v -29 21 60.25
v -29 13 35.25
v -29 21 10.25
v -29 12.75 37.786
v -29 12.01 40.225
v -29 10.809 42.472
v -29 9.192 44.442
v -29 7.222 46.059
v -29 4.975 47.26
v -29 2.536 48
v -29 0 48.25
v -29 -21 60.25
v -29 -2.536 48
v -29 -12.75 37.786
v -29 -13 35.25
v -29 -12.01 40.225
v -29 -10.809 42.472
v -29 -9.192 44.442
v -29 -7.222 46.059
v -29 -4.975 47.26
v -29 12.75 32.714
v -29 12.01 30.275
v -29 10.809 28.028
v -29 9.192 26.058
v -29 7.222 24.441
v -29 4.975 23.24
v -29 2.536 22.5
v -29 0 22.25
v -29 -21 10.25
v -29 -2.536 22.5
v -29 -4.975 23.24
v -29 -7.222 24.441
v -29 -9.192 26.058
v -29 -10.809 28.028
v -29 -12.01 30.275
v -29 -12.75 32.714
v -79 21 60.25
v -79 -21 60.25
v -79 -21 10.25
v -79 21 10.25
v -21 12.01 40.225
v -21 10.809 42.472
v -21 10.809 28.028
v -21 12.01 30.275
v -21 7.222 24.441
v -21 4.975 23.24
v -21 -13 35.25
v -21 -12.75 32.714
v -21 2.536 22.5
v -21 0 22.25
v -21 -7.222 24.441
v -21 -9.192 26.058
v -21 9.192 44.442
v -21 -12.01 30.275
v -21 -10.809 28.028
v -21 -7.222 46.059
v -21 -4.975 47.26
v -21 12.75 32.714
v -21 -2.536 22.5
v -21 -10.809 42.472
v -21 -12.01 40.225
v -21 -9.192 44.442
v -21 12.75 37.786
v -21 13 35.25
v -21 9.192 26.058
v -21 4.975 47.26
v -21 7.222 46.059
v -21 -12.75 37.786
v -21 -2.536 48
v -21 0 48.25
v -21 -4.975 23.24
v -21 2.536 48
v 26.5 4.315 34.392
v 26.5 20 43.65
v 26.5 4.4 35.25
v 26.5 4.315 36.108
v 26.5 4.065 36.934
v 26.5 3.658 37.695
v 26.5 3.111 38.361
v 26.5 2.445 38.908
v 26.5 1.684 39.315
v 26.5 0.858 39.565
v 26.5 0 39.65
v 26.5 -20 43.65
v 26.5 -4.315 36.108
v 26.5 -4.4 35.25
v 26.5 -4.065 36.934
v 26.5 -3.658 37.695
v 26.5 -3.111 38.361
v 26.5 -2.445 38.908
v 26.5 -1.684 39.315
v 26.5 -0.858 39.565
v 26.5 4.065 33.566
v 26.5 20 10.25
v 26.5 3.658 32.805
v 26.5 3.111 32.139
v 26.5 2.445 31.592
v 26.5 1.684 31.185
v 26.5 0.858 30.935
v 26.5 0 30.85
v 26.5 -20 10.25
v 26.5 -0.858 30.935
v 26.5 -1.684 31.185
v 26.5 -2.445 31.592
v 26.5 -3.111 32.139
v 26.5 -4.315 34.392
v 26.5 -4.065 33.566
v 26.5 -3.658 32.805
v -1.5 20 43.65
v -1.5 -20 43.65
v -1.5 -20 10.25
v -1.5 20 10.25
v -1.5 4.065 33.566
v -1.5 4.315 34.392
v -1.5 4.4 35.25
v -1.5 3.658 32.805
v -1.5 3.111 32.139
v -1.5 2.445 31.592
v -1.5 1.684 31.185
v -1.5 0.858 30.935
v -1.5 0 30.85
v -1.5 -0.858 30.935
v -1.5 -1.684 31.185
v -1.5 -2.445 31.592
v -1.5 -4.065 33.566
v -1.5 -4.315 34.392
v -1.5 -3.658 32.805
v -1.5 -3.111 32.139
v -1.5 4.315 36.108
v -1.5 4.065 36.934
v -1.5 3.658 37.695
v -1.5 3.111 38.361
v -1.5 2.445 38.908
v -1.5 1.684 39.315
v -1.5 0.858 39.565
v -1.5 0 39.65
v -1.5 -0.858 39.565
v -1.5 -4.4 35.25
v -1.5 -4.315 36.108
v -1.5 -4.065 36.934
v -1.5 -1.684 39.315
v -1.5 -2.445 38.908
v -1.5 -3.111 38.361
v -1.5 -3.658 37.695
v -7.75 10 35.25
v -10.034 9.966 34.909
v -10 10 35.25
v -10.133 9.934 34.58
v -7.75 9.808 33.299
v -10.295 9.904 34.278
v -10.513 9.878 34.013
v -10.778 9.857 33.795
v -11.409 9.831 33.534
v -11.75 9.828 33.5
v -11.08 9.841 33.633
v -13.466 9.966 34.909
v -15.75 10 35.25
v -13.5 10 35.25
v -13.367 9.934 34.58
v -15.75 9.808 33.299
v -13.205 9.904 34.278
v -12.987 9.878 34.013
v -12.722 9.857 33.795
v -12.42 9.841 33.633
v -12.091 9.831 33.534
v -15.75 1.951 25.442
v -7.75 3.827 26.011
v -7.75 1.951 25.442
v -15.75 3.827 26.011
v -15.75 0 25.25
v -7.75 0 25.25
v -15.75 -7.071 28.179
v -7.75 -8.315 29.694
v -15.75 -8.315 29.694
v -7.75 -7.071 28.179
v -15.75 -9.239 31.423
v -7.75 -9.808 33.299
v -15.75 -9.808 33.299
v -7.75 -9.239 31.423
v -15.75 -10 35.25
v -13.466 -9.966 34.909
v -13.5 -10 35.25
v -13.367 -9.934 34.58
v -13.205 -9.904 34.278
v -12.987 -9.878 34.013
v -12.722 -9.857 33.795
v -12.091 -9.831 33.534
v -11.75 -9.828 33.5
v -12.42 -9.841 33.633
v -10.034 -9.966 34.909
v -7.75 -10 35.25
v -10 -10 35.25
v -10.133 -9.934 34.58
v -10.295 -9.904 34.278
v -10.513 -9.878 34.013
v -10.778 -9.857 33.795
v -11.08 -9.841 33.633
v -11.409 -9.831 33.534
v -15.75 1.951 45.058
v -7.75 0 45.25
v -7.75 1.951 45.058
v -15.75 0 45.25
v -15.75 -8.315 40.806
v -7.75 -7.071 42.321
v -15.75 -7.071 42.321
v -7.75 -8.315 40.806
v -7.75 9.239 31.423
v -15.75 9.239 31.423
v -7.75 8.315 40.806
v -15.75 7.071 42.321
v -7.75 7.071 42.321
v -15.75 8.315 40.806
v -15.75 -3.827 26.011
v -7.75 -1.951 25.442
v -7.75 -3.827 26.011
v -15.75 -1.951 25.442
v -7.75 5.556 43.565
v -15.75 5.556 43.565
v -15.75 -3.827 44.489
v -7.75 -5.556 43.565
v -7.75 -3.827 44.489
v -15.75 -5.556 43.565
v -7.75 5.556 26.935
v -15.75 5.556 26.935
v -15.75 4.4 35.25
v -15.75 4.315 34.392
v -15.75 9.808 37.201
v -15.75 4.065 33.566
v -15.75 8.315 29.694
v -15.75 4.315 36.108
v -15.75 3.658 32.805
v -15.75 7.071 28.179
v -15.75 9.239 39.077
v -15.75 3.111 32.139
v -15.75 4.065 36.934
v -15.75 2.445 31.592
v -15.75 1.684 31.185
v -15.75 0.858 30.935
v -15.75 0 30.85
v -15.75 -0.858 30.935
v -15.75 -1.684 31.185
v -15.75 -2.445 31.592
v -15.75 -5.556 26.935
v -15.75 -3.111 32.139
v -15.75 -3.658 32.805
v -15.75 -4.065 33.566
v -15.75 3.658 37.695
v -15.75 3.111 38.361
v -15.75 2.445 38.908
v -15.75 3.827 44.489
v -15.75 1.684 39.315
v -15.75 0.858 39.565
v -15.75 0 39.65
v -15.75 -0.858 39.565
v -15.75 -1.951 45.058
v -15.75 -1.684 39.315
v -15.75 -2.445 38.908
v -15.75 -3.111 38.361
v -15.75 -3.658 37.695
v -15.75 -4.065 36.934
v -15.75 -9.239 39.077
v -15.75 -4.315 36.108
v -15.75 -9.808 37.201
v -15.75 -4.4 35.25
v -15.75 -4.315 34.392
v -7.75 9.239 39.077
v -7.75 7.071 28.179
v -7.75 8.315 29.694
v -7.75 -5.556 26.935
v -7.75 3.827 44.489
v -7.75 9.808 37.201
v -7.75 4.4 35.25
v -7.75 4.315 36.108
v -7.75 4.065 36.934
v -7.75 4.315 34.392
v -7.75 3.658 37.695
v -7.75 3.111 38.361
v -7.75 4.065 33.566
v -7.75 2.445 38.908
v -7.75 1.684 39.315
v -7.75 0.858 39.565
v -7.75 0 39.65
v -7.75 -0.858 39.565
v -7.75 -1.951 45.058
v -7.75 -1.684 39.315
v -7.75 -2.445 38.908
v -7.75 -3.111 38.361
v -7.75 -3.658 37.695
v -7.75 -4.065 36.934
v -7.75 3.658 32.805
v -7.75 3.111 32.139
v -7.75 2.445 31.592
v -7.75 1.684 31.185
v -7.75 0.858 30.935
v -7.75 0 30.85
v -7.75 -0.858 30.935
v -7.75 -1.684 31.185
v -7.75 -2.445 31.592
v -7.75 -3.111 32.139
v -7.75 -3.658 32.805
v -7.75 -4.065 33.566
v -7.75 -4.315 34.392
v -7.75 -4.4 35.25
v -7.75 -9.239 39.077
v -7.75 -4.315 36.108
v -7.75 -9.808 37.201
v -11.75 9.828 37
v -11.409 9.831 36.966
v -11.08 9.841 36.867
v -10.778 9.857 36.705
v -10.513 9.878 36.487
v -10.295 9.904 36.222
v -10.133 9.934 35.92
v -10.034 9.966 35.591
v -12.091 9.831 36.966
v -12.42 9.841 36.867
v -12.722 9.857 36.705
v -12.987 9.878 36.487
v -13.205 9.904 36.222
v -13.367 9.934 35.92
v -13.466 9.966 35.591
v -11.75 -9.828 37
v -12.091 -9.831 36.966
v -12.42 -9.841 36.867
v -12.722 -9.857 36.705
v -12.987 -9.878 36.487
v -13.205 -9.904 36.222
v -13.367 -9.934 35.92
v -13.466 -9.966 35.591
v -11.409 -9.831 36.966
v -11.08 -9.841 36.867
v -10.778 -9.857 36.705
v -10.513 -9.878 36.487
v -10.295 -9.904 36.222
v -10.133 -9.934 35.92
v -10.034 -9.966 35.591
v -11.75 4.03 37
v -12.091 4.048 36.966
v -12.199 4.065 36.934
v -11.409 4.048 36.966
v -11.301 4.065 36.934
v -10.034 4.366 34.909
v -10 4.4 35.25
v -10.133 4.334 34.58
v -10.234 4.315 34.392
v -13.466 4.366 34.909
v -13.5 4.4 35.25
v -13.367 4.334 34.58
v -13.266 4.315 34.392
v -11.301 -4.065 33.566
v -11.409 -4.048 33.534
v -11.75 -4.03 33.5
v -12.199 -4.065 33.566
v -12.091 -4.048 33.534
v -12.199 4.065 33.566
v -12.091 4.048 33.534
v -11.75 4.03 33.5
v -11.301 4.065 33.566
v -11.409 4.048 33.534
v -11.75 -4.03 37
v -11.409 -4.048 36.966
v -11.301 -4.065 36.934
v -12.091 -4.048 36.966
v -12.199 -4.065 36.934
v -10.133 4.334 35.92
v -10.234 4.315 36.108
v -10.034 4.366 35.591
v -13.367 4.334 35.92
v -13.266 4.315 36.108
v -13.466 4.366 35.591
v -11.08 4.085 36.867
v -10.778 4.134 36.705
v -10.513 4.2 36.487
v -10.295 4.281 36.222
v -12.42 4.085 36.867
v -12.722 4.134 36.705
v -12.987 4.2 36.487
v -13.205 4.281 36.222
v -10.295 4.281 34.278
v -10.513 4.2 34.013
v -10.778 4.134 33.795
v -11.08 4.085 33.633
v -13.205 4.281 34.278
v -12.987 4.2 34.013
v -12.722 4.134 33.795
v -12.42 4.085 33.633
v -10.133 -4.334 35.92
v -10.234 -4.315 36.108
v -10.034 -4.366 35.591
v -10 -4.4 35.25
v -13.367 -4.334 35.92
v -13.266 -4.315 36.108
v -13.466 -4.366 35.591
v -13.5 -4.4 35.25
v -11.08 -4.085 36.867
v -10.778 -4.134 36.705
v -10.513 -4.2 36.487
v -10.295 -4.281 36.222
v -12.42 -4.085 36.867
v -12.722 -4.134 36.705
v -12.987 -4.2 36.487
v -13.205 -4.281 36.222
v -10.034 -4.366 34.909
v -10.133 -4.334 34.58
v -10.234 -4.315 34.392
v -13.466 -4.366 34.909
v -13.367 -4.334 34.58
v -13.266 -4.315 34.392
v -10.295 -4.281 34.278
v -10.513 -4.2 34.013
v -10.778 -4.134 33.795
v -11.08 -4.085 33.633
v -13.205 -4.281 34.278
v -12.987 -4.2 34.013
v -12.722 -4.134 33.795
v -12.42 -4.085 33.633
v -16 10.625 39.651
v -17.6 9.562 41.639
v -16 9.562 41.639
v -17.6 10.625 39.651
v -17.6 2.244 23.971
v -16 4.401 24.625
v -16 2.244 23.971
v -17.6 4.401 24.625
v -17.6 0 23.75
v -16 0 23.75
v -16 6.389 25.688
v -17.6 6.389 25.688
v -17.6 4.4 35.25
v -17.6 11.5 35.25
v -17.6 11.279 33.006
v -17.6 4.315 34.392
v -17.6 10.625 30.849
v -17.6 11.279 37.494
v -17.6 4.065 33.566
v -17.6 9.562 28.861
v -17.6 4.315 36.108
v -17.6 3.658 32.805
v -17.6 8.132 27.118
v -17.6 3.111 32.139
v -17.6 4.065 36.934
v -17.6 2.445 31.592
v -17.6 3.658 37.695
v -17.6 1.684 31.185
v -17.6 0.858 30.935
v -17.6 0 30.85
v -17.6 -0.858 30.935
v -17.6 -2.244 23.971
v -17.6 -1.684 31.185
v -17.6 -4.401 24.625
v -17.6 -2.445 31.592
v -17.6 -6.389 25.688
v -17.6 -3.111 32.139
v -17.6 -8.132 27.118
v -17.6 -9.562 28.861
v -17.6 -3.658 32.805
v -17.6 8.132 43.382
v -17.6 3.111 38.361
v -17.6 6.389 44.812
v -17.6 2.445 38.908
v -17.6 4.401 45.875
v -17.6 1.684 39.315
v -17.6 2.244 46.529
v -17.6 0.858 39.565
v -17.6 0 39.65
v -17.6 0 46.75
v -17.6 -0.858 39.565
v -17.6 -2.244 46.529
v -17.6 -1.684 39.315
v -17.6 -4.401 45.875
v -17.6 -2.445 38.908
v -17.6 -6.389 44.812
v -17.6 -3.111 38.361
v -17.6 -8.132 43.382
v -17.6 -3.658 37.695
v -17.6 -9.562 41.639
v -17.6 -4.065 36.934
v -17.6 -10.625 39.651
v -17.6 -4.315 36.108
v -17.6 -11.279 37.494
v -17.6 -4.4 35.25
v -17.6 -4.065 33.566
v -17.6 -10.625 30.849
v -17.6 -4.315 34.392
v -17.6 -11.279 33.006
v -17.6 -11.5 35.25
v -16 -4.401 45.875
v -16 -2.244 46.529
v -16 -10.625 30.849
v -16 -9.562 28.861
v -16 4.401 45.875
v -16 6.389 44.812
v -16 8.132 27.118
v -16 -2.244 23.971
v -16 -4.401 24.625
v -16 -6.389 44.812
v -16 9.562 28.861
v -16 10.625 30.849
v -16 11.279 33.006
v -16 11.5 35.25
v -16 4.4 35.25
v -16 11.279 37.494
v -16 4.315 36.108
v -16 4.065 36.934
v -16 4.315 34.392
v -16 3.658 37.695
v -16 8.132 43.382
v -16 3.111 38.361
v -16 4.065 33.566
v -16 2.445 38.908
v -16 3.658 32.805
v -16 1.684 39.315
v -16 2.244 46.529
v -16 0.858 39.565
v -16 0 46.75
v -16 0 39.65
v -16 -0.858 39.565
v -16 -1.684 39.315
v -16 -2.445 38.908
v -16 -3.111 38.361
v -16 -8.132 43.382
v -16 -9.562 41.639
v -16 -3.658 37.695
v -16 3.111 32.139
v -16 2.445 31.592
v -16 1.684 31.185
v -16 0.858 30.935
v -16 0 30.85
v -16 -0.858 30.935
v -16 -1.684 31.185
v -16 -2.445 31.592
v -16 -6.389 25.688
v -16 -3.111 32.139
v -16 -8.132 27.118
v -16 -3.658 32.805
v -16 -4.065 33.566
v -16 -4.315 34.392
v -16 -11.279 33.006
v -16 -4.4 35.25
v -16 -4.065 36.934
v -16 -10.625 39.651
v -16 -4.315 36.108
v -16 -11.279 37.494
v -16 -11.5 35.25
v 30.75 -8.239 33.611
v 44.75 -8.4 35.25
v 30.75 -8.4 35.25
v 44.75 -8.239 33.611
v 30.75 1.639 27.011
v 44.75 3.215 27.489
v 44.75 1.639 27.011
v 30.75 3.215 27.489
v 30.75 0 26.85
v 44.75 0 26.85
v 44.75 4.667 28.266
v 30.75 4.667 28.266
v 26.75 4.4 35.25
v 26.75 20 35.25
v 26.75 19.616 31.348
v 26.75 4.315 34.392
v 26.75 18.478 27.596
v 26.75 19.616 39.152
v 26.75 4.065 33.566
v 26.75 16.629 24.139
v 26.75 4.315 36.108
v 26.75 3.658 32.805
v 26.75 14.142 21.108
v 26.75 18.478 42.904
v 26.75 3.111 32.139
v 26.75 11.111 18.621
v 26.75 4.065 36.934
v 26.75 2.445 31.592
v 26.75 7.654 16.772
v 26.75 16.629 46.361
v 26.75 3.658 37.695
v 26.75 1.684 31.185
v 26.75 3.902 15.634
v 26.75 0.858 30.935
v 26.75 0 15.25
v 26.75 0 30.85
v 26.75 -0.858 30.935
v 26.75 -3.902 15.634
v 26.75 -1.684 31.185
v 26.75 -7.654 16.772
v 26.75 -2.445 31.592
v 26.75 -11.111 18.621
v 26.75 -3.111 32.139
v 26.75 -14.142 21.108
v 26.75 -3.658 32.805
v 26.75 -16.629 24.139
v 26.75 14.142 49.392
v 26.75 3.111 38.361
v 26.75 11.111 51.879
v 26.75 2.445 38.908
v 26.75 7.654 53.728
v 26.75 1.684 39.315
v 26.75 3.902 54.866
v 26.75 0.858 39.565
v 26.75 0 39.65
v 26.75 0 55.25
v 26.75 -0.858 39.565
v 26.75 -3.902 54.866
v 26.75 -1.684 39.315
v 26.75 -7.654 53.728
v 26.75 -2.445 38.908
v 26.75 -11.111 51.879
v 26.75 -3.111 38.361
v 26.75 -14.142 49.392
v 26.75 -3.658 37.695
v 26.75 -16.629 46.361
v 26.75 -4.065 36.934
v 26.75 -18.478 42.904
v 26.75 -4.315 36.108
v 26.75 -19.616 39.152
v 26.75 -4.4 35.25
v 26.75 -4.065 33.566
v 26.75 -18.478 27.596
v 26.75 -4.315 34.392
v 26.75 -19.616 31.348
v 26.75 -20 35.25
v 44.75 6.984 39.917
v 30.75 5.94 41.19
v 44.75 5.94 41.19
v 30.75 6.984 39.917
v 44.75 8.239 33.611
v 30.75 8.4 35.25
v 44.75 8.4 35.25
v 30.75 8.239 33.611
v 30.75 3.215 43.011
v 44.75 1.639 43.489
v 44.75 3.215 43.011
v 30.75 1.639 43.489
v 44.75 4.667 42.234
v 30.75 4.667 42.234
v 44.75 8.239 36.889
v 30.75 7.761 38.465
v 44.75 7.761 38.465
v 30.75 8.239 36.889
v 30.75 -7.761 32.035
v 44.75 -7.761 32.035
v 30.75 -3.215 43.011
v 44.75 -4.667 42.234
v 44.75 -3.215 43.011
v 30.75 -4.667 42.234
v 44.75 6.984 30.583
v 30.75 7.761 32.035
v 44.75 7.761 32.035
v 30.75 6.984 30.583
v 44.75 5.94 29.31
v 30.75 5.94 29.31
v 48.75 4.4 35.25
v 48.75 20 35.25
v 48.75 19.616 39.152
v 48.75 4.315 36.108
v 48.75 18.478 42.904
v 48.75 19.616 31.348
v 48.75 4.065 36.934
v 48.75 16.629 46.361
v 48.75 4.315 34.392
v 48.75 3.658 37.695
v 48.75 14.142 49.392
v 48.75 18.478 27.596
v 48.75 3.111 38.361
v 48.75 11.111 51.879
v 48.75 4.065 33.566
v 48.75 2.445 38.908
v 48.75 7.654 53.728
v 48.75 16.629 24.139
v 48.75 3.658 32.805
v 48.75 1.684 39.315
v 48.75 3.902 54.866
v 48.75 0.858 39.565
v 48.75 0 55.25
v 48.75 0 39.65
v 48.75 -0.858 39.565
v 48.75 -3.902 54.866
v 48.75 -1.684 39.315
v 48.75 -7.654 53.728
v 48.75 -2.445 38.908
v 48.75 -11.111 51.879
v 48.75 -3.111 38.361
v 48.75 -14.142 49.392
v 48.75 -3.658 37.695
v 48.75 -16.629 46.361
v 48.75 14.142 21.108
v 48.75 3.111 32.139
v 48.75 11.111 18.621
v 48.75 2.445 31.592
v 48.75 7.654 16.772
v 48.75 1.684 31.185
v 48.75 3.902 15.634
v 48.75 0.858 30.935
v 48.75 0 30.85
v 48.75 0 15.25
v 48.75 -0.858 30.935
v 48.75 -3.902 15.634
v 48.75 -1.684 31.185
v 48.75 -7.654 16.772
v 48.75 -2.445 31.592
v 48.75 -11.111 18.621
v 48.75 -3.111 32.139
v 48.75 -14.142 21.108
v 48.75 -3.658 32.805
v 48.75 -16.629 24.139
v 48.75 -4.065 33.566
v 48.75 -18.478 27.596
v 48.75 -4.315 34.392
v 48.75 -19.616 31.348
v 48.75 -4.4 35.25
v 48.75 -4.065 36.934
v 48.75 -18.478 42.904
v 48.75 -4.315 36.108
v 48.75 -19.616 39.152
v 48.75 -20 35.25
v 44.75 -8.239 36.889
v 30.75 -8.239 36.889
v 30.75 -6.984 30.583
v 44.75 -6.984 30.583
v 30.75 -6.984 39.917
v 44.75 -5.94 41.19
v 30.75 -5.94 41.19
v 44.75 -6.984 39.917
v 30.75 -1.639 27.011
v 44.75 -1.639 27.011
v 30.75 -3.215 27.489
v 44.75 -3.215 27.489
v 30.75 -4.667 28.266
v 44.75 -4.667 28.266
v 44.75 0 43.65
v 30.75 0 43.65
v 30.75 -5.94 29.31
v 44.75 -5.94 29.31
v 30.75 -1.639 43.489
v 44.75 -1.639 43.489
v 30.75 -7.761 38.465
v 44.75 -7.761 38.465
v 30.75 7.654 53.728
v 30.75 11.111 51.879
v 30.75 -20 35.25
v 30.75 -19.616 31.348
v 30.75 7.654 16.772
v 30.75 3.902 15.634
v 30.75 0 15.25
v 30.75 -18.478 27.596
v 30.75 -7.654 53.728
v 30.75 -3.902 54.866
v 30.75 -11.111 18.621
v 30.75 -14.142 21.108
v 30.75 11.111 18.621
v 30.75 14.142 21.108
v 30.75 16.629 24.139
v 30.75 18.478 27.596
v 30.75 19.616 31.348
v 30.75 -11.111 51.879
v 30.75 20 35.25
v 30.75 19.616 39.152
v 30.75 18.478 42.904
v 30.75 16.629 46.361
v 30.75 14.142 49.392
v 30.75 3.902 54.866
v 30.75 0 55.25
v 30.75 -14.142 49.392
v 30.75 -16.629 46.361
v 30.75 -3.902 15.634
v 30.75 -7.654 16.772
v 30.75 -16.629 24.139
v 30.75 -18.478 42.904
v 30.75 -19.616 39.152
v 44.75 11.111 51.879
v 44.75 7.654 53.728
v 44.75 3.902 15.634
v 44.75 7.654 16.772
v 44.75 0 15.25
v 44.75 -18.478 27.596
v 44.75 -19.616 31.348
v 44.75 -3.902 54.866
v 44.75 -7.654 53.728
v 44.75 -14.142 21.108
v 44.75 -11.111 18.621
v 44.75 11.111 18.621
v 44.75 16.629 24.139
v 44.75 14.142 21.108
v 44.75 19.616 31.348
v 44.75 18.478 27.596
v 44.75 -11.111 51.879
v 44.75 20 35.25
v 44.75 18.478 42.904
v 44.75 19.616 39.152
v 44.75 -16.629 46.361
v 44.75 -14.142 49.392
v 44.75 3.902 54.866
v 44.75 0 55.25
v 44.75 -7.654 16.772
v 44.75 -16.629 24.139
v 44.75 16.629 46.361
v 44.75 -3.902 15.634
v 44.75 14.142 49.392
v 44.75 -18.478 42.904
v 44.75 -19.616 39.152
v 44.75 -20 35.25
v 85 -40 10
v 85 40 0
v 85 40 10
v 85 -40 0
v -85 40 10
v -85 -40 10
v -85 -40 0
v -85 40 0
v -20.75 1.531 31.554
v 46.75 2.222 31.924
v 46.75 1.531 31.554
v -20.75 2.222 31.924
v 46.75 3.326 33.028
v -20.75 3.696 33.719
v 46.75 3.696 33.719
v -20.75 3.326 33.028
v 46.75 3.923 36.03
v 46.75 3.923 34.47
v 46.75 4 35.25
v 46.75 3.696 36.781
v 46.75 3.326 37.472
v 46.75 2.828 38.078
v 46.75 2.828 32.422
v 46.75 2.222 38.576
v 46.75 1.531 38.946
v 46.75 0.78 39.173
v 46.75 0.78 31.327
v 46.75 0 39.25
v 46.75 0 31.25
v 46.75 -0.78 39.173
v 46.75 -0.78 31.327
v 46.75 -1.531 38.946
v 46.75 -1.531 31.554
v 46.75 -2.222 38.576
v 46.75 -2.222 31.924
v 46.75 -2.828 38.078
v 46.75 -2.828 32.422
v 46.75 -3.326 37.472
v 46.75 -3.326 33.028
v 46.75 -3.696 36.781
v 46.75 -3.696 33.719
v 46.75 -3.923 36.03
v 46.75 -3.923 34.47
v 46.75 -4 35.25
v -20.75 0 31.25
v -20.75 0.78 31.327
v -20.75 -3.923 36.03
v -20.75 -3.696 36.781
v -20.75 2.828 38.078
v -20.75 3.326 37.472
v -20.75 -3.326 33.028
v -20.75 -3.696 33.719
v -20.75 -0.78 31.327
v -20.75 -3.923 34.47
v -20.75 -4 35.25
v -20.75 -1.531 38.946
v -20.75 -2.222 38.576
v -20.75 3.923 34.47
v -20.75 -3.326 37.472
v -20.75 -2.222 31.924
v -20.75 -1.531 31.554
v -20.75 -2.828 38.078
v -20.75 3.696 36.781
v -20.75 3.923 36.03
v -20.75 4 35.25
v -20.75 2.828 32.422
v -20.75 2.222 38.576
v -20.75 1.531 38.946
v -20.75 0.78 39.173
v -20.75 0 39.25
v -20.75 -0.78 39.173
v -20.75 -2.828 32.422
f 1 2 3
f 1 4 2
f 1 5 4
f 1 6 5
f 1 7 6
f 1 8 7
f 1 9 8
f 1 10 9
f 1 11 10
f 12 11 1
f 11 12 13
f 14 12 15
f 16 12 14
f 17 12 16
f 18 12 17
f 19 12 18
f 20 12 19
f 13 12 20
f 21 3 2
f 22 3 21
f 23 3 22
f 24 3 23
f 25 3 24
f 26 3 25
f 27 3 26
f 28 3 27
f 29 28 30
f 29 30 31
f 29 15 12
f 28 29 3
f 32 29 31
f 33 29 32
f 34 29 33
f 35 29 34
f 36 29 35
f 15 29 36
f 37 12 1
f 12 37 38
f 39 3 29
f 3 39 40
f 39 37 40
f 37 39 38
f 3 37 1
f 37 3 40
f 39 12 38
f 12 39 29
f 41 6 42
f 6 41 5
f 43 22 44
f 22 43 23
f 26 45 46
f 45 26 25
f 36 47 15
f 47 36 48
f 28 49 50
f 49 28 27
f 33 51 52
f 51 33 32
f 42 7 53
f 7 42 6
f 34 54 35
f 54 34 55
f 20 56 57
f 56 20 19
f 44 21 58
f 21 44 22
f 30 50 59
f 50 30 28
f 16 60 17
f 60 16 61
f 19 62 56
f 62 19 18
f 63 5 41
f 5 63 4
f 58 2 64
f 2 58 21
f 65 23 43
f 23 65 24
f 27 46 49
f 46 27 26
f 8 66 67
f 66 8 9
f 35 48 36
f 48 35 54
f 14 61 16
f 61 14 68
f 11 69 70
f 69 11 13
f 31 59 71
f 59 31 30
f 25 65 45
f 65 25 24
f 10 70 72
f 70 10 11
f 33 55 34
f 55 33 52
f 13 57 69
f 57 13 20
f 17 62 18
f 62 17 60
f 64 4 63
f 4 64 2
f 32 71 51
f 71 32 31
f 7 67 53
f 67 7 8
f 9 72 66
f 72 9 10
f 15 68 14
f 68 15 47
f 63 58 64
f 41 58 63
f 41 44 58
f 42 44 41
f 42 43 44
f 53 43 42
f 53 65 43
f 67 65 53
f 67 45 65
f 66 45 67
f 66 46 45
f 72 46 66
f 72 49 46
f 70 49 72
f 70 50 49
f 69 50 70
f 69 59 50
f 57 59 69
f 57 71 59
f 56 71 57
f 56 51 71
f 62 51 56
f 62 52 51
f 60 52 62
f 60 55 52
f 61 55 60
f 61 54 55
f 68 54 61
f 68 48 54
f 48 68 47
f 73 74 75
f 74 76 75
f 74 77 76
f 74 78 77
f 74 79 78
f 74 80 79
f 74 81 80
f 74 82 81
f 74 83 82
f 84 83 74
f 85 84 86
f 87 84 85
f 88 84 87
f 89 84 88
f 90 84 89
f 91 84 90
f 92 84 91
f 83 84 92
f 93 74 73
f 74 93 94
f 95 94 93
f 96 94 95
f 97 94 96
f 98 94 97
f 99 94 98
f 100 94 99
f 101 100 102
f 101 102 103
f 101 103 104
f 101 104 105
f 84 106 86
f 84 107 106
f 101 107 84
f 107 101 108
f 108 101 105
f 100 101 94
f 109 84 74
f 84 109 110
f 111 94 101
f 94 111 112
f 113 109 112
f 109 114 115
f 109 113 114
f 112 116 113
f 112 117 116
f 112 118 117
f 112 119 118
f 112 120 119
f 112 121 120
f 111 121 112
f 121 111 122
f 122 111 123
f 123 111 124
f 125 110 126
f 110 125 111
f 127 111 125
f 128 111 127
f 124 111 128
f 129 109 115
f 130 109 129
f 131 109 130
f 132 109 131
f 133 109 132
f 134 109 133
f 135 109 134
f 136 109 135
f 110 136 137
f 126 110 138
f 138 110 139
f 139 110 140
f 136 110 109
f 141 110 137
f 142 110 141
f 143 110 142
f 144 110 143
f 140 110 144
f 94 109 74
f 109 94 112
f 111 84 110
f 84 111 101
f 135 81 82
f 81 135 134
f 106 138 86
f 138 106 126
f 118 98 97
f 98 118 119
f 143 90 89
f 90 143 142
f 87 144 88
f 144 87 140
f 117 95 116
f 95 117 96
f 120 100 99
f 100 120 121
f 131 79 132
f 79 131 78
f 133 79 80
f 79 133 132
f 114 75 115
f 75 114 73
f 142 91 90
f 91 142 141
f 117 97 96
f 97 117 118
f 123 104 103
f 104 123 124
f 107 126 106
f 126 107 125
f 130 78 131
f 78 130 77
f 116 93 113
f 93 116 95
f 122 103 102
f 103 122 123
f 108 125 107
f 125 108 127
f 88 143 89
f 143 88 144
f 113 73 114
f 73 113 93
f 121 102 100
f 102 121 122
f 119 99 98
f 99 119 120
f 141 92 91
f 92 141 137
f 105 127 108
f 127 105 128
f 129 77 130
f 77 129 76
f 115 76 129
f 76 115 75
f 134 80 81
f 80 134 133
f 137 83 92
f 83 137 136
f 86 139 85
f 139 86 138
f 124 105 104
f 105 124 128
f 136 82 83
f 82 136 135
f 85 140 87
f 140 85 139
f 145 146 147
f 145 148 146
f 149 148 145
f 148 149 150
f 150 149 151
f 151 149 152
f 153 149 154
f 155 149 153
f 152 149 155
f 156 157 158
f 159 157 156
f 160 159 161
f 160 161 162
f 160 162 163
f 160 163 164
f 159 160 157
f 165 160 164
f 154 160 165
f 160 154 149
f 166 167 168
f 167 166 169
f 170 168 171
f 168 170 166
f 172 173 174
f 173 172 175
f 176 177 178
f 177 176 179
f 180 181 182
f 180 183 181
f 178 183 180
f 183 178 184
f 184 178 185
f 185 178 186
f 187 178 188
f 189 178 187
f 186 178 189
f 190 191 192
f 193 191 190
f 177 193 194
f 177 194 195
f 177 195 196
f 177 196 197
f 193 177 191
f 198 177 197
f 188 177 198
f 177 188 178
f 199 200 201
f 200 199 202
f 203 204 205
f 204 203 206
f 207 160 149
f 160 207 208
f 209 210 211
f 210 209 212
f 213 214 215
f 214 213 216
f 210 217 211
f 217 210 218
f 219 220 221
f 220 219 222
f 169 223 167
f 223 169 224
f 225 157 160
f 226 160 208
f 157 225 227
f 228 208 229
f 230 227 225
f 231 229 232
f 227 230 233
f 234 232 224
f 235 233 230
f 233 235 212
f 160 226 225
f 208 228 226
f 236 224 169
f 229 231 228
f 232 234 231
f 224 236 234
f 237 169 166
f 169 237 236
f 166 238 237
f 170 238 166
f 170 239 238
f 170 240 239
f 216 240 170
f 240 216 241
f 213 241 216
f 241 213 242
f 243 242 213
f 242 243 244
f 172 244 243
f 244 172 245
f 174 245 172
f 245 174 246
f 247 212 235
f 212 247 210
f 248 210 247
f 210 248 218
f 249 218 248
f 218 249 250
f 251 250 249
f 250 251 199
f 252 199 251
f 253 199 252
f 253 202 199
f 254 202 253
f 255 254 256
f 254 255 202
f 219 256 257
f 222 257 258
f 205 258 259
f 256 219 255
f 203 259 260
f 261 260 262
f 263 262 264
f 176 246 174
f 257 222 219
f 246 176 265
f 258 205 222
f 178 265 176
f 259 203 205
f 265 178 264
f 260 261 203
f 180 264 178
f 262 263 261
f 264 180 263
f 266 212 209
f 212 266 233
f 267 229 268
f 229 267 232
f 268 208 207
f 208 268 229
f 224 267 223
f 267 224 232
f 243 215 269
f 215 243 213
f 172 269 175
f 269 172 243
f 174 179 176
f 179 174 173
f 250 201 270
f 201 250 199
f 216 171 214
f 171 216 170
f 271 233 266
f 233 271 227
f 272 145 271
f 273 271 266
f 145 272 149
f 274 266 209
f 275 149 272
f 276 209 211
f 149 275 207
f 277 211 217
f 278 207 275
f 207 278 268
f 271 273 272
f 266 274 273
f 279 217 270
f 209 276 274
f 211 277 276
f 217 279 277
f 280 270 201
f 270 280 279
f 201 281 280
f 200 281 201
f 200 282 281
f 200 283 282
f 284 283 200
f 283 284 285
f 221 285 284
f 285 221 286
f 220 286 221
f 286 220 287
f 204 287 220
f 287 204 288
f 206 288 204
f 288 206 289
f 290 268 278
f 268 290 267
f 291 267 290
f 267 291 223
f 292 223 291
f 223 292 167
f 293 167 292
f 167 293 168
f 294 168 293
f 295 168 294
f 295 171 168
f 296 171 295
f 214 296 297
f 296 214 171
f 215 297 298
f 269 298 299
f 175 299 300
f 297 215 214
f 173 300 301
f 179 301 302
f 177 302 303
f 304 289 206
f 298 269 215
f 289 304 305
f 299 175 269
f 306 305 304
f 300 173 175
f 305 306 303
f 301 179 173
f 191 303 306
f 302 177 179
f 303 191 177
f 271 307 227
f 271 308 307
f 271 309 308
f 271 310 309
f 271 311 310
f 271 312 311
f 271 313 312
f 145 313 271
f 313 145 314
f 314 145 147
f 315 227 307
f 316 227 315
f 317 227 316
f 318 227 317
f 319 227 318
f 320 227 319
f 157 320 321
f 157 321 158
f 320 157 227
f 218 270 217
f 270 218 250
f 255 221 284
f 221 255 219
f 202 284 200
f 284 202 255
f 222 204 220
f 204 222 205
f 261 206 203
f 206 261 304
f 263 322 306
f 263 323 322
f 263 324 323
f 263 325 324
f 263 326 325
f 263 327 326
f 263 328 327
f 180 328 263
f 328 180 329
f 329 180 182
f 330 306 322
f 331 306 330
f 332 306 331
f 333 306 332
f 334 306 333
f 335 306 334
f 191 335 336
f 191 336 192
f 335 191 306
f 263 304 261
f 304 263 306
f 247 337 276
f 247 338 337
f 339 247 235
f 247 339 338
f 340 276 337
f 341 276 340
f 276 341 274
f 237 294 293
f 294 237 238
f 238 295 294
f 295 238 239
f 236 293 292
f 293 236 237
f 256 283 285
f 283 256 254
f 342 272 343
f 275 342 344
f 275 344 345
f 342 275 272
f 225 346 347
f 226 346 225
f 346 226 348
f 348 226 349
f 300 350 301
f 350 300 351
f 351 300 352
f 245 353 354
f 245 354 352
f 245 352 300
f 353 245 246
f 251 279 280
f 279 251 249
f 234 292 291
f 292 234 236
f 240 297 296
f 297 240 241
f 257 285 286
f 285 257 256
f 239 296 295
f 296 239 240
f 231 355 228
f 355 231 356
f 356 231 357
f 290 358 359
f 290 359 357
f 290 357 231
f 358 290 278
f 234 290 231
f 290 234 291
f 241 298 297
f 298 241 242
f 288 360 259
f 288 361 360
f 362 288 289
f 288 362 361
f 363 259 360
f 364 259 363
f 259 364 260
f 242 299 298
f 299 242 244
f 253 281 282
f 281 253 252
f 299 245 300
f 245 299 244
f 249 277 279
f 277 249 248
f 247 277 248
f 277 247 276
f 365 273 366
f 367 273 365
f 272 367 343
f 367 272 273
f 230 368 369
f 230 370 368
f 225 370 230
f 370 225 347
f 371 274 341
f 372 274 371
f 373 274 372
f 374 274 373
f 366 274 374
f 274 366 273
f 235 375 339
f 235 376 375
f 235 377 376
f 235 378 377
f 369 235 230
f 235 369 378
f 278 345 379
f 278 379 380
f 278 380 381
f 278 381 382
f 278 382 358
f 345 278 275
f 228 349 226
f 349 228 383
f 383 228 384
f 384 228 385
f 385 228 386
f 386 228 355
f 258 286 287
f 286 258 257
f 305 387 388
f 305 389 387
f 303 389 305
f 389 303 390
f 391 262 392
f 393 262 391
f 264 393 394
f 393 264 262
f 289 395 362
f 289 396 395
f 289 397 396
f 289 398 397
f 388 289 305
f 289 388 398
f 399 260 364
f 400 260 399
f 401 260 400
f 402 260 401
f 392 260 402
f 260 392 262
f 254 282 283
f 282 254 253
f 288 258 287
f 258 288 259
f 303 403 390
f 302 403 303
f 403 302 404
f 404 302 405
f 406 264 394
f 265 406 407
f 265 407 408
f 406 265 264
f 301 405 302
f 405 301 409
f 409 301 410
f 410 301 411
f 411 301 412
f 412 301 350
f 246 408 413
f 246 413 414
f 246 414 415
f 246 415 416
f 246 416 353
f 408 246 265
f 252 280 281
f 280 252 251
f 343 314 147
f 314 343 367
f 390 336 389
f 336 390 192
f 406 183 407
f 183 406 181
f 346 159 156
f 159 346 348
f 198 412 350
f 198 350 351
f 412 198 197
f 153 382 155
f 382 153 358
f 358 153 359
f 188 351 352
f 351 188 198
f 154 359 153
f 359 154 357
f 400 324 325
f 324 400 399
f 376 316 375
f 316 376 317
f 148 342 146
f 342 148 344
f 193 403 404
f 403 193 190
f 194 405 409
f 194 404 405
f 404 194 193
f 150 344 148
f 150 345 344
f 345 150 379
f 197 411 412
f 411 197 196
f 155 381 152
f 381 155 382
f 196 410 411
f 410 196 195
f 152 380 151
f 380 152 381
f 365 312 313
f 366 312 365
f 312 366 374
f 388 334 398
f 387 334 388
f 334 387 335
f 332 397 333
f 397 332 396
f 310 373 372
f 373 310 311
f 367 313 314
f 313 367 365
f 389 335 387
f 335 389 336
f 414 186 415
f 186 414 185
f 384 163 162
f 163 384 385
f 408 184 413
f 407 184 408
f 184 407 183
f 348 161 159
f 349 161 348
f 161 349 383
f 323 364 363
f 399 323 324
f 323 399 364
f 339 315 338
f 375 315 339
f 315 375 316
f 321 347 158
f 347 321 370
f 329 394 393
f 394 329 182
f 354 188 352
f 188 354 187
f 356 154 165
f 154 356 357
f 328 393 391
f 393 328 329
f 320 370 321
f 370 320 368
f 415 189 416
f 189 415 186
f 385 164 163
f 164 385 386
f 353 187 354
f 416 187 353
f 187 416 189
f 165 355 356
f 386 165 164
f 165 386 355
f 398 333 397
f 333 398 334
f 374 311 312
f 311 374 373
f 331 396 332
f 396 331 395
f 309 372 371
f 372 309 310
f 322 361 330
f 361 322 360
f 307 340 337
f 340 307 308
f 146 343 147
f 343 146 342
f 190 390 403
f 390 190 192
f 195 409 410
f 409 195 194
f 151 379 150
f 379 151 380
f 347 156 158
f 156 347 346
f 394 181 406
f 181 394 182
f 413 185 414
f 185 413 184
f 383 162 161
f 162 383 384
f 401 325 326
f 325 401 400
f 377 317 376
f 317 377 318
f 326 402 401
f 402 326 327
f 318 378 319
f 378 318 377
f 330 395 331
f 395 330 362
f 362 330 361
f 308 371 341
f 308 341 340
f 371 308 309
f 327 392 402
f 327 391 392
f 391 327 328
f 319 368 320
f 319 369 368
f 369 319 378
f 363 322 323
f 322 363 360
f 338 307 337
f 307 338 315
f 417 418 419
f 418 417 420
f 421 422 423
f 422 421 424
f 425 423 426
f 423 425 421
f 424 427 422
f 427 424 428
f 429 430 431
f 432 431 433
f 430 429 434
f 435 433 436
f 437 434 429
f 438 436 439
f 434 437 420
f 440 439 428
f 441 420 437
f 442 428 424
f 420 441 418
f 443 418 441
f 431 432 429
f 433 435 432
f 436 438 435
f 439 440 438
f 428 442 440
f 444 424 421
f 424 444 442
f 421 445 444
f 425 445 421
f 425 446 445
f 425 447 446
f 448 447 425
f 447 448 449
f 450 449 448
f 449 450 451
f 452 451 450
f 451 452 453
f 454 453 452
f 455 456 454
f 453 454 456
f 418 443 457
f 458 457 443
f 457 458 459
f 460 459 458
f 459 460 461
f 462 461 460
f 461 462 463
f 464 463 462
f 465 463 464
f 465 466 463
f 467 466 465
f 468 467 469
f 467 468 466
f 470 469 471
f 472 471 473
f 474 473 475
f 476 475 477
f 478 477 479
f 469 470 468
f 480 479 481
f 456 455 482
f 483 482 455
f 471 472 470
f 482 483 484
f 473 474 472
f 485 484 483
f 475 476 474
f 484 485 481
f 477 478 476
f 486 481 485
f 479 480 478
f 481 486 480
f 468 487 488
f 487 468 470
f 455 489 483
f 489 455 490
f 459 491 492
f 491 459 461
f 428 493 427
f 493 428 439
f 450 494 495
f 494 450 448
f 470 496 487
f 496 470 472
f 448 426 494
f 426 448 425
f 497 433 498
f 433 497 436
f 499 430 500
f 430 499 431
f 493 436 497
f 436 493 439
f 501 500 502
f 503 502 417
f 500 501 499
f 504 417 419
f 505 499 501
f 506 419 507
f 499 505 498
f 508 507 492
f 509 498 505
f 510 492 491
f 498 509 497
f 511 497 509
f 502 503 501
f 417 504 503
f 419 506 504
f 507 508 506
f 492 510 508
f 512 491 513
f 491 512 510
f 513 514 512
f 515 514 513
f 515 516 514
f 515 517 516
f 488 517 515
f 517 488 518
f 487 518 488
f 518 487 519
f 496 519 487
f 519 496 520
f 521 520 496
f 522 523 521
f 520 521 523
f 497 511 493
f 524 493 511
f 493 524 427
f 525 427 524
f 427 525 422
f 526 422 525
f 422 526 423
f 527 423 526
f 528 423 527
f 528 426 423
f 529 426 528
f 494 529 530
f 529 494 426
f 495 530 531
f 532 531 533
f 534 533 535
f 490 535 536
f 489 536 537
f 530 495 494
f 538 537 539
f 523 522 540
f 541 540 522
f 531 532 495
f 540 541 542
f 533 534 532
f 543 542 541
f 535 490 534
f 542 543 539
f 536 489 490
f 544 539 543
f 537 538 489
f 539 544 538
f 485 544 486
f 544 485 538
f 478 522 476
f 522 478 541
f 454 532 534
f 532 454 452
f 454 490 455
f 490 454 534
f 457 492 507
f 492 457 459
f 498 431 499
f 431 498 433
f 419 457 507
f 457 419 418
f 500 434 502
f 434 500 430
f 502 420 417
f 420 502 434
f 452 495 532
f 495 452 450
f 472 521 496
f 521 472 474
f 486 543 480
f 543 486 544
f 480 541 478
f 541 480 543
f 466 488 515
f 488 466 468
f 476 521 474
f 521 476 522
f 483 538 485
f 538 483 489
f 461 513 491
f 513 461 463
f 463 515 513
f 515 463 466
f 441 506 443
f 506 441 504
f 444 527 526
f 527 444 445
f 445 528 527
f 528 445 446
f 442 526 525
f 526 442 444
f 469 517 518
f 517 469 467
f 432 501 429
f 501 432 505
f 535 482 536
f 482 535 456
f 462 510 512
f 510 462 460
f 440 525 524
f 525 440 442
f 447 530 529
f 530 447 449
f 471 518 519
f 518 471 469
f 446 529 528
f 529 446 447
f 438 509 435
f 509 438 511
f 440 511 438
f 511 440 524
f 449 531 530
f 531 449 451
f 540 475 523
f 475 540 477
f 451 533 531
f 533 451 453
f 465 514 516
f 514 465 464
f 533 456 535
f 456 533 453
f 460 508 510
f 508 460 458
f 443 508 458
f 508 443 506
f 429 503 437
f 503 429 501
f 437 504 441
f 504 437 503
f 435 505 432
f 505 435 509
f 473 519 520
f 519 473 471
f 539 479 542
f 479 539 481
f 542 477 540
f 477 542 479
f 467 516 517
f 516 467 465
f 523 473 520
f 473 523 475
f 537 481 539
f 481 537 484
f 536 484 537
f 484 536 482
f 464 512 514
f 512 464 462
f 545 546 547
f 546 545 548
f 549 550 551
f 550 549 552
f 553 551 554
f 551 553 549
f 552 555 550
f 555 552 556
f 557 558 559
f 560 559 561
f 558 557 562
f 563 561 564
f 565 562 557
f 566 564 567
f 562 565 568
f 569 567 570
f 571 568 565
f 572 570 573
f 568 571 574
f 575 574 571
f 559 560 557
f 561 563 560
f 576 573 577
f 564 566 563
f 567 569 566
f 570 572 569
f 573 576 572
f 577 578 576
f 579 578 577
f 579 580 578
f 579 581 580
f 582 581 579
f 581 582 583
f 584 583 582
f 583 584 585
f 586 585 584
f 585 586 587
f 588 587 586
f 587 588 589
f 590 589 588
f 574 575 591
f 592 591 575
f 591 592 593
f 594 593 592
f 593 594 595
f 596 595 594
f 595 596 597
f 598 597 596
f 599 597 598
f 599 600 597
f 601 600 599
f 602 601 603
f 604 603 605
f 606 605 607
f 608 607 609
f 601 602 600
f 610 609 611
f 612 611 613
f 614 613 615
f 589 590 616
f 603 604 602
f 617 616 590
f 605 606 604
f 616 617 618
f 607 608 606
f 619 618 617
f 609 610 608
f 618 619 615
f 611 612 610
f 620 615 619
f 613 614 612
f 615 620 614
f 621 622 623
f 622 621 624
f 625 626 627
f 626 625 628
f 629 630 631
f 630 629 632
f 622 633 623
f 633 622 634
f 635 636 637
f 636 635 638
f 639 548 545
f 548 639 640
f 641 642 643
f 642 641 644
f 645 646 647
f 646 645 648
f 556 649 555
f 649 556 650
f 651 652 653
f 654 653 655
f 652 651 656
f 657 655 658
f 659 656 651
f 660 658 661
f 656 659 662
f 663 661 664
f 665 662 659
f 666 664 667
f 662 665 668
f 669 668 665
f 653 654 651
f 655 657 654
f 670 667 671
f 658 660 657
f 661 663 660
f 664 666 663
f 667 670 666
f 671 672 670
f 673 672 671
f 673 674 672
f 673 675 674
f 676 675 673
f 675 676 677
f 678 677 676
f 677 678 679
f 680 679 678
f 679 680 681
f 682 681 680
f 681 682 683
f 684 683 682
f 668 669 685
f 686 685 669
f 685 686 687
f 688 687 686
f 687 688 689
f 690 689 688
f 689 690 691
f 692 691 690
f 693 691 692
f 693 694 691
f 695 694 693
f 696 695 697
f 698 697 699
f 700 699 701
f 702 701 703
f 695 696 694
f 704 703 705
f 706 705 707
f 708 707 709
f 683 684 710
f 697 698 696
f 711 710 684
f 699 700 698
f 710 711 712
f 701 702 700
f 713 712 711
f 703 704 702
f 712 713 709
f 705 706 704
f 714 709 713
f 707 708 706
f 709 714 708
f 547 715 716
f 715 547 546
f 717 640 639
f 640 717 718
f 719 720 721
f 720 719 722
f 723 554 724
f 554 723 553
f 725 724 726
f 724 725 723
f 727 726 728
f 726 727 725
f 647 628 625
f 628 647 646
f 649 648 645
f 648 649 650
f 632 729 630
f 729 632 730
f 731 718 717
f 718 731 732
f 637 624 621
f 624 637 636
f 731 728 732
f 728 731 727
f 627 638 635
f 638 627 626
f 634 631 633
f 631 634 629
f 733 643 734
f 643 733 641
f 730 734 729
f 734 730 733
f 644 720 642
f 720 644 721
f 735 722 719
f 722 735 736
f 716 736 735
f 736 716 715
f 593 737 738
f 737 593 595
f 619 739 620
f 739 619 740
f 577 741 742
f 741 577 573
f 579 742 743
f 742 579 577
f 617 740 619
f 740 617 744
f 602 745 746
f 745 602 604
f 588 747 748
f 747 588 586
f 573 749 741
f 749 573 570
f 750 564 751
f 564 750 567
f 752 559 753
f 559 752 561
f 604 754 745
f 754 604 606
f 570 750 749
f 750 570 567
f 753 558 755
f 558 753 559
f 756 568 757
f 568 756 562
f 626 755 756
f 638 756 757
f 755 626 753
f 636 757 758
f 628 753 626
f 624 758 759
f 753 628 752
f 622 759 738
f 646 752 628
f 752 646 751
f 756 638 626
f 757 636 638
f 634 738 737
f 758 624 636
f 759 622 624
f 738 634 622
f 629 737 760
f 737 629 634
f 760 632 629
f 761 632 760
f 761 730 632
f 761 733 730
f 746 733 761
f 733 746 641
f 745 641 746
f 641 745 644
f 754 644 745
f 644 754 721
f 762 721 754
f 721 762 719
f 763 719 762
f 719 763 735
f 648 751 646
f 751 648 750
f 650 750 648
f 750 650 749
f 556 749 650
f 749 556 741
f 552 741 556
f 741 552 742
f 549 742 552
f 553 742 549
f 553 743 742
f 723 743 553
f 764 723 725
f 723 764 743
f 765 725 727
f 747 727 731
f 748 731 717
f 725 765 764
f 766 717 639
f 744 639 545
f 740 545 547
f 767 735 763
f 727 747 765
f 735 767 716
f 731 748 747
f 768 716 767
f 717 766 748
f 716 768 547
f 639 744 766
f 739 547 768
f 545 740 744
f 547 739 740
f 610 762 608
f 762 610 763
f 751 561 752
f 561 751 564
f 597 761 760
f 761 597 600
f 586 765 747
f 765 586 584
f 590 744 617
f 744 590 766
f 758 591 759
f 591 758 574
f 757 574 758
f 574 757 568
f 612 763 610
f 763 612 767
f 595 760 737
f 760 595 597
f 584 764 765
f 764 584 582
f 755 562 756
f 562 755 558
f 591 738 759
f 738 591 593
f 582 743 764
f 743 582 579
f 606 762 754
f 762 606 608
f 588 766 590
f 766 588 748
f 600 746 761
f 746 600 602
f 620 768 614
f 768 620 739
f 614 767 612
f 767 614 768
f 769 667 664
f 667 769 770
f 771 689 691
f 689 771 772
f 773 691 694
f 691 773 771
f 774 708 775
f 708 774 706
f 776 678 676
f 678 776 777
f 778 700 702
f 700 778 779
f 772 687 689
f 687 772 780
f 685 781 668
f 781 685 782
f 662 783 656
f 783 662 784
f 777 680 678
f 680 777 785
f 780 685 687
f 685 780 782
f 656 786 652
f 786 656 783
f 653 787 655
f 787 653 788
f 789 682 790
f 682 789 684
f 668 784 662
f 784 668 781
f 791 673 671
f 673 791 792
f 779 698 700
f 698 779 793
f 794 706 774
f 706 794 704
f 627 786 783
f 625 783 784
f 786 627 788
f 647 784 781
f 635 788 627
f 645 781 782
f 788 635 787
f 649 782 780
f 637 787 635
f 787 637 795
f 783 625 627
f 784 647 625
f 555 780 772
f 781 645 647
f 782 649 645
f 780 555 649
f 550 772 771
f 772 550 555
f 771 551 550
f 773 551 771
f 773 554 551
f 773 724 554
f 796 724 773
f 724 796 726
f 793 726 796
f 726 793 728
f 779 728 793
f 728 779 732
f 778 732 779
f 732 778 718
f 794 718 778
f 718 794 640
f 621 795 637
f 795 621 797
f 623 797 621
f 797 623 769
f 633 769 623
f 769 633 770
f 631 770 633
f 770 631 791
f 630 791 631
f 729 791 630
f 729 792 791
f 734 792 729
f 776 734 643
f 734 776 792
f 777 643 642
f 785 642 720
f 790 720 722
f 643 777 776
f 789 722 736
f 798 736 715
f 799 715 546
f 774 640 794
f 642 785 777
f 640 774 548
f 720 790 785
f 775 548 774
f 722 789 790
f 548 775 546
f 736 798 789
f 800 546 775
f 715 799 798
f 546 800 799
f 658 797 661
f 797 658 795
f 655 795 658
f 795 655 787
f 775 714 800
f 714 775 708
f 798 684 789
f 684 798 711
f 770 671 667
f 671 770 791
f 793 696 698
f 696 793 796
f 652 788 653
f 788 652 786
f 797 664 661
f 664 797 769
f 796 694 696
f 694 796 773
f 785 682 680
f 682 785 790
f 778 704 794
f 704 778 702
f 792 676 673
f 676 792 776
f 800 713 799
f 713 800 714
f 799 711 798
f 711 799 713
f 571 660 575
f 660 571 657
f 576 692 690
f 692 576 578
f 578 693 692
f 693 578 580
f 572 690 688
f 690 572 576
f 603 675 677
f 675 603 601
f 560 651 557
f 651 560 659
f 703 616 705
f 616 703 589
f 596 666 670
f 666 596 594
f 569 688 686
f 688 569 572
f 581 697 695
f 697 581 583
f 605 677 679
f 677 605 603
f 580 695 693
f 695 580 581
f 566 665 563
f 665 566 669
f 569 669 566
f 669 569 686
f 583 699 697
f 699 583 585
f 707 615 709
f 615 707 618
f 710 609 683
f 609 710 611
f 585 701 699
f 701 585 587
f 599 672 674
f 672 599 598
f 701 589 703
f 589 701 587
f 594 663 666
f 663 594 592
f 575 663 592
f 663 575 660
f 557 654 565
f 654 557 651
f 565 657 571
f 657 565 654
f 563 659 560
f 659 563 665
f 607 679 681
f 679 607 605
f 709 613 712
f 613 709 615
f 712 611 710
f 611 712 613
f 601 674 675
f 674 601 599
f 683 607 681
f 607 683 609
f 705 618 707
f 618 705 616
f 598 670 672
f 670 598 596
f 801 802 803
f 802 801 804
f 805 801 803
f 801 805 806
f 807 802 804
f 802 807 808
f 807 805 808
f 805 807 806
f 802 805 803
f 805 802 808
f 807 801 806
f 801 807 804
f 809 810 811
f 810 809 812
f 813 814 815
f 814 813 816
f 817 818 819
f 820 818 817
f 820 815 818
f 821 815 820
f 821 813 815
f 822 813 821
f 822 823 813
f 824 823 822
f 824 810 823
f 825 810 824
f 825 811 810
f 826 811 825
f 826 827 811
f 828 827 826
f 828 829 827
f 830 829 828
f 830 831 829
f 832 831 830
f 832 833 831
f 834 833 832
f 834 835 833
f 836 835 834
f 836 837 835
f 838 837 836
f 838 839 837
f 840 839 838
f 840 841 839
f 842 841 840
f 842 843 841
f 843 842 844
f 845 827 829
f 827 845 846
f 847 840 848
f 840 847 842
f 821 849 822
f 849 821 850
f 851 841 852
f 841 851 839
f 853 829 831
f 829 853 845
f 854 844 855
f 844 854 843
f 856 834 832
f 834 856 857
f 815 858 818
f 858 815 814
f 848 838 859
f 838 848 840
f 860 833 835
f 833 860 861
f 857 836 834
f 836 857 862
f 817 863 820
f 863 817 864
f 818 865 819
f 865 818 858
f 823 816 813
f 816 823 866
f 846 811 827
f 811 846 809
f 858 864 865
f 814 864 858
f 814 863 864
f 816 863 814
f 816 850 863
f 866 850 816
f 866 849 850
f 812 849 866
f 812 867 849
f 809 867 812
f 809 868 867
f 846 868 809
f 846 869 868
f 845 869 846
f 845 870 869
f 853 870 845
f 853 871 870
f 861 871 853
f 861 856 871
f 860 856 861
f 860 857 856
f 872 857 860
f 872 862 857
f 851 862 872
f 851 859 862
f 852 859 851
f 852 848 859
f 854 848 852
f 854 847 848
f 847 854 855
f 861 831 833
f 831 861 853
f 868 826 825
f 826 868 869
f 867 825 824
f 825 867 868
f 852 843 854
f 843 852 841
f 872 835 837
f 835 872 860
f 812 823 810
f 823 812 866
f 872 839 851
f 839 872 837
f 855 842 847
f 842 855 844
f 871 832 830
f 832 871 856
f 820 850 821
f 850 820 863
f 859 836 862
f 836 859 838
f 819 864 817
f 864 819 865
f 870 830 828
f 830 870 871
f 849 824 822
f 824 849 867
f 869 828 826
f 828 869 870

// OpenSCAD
$fn = 32;

// ------------------------------------------------------------------------
// Motor drive station: motor 50 x 50 mm, shaft d8, pulley d40
// Every part is its own module, assembly() places every instance.
// ------------------------------------------------------------------------

// --- part 1 ---
module station_bed() {
  difference() {
    translate([-85, -40, 0]) cube([170, 80, 10]);
  }
}

// --- part 2 ---
module drive_motor() {
  union() {
    translate([-25, -21, 0]) cube([50, 42, 50]);
    translate([29, 0, 25]) rotate([0, 90, 0]) cylinder(h = 8, d = 26, center = true);
  }
}

// --- part 3 ---
module pillow_block() {
  difference() {
    translate([-14, -20, 0]) cube([28, 40, 33.4]);
    translate([0, 0, 25]) rotate([0, 90, 0]) cylinder(h = 30, d = 8.8, center = true);
  }
}

// --- part 4 ---
module drive_shaft() {
  translate([0, 0, -33.75]) cylinder(h = 67.5, d = 8);
}

// --- part 5 ---
module shaft_collar() {
  difference() {
    cylinder(h = 8, d = 20);
    translate([0, 0, -1]) cylinder(h = 10, d = 8.8);
    translate([0, 0, 4]) rotate([90, 0, 0]) cylinder(h = 22, d = 3.5, center = true);
  }
}

// --- part 6 ---
module collar_washer() {
  difference() {
      translate([0, 0, 0]) cylinder(h = 1.6, d = 23);
      translate([0, 0, -1]) cylinder(h = 3.6, d = 8.8);
    }
}

// --- part 7 ---
module drive_pulley() {
  difference() {
    union() {
      cylinder(h = 22, d = 16.8);
      cylinder(h = 4, d = 40);
      translate([0, 0, 18]) cylinder(h = 4, d = 40);
    }
    translate([0, 0, -1]) cylinder(h = 24, d = 8.8);
  }
}

// --- assembly ---
module assembly() {
  color([0.80, 0.24, 0.20]) translate([0, 0, 0]) rotate([0, 0, 0]) station_bed();
  color([0.20, 0.45, 0.75]) translate([-54, 0, 10.25]) rotate([0, 0, 0]) drive_motor();
  color([0.25, 0.62, 0.32]) translate([12.5, 0, 10.25]) rotate([0, 0, 0]) pillow_block();
  color([0.92, 0.70, 0.18]) translate([13, 0, 35.25]) rotate([0, 90, 0]) drive_shaft();
  color([0.58, 0.35, 0.70]) translate([-15.75, 0, 35.25]) rotate([0, 90, 0]) shaft_collar();
  color([0.16, 0.66, 0.66]) translate([-17.6, 0, 35.25]) rotate([0, 90, 0]) collar_washer();
  color([0.85, 0.48, 0.18]) translate([26.75, 0, 35.25]) rotate([0, 90, 0]) drive_pulley();
}

assembly();
